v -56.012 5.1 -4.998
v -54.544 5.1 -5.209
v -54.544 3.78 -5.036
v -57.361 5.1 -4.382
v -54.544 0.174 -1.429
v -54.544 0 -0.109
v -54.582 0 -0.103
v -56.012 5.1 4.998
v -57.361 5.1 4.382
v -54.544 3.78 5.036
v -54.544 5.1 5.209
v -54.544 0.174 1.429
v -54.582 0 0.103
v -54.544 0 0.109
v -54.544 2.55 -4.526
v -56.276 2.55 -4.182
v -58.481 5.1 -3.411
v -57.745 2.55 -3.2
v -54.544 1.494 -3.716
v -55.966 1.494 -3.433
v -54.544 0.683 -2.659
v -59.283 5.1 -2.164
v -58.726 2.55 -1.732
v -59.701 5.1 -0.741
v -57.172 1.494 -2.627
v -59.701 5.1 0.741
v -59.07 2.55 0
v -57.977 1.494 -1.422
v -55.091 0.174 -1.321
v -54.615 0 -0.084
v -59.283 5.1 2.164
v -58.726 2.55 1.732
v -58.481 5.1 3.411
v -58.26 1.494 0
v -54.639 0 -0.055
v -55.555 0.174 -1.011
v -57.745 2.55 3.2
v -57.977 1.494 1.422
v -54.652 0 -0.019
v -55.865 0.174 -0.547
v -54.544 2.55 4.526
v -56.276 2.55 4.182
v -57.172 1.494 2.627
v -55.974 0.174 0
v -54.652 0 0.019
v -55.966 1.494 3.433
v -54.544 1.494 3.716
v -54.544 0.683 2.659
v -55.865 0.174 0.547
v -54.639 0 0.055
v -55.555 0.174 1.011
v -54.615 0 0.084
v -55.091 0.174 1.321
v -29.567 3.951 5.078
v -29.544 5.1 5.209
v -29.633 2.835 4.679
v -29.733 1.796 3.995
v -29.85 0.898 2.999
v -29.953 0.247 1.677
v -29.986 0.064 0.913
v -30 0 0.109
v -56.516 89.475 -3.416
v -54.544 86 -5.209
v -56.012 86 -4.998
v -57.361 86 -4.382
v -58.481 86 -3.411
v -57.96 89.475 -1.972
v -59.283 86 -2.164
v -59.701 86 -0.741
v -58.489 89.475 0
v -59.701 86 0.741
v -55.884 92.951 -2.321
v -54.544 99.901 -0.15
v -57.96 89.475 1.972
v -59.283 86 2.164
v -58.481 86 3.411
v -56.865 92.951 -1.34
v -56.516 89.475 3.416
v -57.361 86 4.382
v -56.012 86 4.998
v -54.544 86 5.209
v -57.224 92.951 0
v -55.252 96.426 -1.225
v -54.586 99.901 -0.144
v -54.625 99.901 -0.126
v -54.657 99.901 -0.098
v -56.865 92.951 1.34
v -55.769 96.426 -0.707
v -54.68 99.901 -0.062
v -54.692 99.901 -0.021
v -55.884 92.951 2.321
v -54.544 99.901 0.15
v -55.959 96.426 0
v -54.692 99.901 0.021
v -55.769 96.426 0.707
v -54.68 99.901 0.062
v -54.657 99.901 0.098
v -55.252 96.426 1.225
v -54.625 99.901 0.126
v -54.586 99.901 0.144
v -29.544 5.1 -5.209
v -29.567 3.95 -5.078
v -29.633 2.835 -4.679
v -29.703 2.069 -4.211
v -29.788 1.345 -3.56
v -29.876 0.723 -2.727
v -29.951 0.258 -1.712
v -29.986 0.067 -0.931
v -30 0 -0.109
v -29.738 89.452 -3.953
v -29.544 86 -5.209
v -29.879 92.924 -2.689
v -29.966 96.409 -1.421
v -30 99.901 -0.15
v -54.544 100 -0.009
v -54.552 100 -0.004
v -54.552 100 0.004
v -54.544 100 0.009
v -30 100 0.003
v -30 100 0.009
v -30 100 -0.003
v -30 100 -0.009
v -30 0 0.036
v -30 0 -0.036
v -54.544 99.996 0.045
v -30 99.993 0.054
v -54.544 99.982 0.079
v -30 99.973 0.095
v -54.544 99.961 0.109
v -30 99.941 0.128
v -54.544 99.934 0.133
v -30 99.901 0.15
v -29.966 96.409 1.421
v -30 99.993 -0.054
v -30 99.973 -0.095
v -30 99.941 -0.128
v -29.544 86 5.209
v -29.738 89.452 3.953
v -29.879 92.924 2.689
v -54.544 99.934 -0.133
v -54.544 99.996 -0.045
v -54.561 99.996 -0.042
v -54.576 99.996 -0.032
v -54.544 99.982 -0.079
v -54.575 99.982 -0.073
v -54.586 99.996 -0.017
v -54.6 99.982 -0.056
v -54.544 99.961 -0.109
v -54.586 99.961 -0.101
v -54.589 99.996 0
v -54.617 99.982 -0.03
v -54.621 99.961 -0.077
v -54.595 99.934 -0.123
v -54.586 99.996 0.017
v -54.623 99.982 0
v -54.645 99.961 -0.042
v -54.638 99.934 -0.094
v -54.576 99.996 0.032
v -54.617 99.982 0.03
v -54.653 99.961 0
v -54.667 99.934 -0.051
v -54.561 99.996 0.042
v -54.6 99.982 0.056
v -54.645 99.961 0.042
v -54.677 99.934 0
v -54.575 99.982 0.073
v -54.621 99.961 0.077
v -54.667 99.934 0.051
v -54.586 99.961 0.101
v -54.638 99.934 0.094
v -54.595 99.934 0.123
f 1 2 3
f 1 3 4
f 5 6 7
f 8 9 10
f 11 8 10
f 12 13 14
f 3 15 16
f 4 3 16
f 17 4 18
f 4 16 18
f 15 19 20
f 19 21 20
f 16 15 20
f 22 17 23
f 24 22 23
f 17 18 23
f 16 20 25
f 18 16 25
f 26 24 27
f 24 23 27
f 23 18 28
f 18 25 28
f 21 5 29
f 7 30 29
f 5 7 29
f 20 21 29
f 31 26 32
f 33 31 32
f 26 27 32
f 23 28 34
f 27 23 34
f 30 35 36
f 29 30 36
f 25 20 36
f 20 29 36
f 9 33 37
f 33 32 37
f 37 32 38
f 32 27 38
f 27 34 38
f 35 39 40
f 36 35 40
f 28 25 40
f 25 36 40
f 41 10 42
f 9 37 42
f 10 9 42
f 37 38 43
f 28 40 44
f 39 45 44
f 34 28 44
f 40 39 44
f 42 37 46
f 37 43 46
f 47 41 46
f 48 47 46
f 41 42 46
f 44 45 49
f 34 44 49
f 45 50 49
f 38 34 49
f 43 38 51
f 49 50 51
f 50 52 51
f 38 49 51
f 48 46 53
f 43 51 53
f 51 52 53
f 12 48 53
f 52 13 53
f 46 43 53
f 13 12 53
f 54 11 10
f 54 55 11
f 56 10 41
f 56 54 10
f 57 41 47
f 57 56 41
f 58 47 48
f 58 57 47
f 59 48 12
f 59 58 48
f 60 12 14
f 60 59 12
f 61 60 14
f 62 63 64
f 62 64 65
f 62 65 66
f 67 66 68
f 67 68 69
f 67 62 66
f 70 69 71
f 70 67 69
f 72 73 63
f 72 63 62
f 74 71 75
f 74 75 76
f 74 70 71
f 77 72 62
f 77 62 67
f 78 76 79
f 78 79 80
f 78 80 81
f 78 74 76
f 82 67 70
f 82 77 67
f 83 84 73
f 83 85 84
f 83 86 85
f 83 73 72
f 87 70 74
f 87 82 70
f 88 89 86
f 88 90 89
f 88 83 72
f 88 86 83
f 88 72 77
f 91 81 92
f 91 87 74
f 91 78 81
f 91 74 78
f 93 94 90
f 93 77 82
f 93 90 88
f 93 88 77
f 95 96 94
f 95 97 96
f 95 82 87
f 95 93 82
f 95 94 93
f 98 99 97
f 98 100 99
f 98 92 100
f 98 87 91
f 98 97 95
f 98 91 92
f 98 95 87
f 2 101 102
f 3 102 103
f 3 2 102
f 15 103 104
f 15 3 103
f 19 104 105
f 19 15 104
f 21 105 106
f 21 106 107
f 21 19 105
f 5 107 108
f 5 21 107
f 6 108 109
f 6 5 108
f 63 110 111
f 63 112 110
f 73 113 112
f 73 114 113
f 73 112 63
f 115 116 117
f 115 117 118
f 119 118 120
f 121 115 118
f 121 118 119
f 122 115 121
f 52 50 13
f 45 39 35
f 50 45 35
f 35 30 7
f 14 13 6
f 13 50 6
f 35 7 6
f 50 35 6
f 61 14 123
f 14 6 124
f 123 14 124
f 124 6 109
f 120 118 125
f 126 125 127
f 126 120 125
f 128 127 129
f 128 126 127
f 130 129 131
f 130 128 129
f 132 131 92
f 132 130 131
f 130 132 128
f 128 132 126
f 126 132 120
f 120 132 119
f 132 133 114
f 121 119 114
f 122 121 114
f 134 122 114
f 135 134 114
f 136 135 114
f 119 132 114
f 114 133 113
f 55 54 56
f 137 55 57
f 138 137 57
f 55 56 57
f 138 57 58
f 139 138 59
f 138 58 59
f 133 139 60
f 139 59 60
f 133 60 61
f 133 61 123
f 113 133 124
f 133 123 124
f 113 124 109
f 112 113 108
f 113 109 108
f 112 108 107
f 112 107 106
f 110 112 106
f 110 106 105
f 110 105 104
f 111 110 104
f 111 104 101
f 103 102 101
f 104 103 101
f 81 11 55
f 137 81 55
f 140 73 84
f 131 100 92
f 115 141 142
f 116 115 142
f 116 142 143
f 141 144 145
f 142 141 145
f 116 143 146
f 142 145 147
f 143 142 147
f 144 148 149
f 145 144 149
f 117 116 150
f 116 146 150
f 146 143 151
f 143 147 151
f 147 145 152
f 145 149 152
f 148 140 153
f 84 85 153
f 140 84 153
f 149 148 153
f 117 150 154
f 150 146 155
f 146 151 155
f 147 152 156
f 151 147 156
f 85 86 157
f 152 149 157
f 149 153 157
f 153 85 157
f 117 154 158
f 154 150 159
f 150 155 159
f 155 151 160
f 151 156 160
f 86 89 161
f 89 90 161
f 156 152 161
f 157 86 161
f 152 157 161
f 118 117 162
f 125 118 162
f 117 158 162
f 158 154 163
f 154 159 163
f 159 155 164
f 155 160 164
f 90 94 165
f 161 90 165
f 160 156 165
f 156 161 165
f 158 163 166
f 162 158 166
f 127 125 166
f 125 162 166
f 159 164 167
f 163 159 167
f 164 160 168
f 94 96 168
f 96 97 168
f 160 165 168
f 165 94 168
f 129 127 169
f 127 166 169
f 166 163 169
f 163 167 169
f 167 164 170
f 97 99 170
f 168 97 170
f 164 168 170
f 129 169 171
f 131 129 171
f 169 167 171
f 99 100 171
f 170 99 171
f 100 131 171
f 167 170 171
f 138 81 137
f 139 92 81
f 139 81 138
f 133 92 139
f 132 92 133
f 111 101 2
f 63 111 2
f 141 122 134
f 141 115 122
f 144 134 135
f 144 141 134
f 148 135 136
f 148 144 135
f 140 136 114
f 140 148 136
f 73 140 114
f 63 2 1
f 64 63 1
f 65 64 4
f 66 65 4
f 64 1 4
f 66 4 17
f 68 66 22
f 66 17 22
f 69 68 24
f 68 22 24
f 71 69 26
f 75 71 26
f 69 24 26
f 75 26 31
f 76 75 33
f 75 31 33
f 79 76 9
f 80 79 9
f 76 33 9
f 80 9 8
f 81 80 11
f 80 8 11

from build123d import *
from OCP.BRepFilletAPI import BRepFilletAPI_MakeChamfer

# Parameters (mm, degrees)
BOSS_EXTRUDE1_DEPTH = 100
CHAMFER1_SIZE       = 14
CHAMFER1_SIZE2      = 5.09558328
FILLET1_R           = 0.15
FILLET2_R           = 5.1


with BuildPart() as part:
    # Sketch1 → Boss-Extrude1 (new body)
    with BuildSketch(Plane(origin=(0, 0, 0), x_dir=(1, 0, 0), z_dir=(0, 1, 0))):
        with BuildLine():
            ThreePointArc((-29.54423259, -5.20944533), (-30, 0), (-29.54423259, 5.20944533))
            Line((-29.54423259, 5.20944533), (-54.54423259, 5.20944533))
            ThreePointArc((-54.54423259, 5.20944533), (-59.75367792, 0), (-54.54423259, -5.20944533))
            Line((-54.54423259, -5.20944533), (-29.54423259, -5.20944533))
        make_face()
    extrude(amount=BOSS_EXTRUDE1_DEPTH)

    # Chamfer1: one chamfer whose edges measure the first distance from different faces: ONE call of the kernel's chamfer builder (chamfer() names one face for all edges)
    chamfer1_edges_1 = [part.edges().sort_by_distance(p)[0] for p in [
        (-59.75367792, 100, 0),
    ]]
    chamfer1_side_1 = [part.faces().sort_by_distance(p)[0] for p in [
        (-59.75367792, 50, 0),
    ]]
    chamfer1_edges_2 = [part.edges().sort_by_distance(p)[0] for p in [
        (-42.04423259, 100, 5.20944533),
    ]]
    chamfer1_side_2 = [part.faces().sort_by_distance(p)[0] for p in [
        (-42.04423259, 50, 5.20944533),
    ]]
    chamfer1_edges_3 = [part.edges().sort_by_distance(p)[0] for p in [
        (-42.04423259, 100, -5.20944533),
    ]]
    chamfer1_side_3 = [part.faces().sort_by_distance(p)[0] for p in [
        (-42.04423259, 50, -5.20944533),
    ]]
    chamfer1 = BRepFilletAPI_MakeChamfer(part.part.solid().wrapped)
    for e in chamfer1_edges_1:
        chamfer1.Add(CHAMFER1_SIZE, CHAMFER1_SIZE2, e.wrapped, chamfer1_side_1[0].wrapped)  # the first distance lies on this face
    for e in chamfer1_edges_2:
        chamfer1.Add(CHAMFER1_SIZE, CHAMFER1_SIZE2, e.wrapped, chamfer1_side_2[0].wrapped)  # the first distance lies on this face
    for e in chamfer1_edges_3:
        chamfer1.Add(CHAMFER1_SIZE, CHAMFER1_SIZE2, e.wrapped, chamfer1_side_3[0].wrapped)  # the first distance lies on this face
    add(Compound.cast(chamfer1.Shape()), mode=Mode.REPLACE)

    # Fillet1
    fillet1_edges = [part.edges().sort_by_distance(p)[0] for p in [
        (-42.272008257, 100, -0.11386205),
        (-54.658094641, 100, 0),
        (-42.272008257, 100, 0.11386205),
    ]]
    fillet(fillet1_edges, radius=FILLET1_R)

    # Fillet2
    fillet2_edges = [part.edges().sort_by_distance(p)[0] for p in [
        (-42.04423259, 0, 5.20944533),
        (-59.75367792, 0, 0),
        (-42.04423259, 0, -5.20944533),
    ]]
    fillet(fillet2_edges, radius=FILLET2_R)


solid = part.part
